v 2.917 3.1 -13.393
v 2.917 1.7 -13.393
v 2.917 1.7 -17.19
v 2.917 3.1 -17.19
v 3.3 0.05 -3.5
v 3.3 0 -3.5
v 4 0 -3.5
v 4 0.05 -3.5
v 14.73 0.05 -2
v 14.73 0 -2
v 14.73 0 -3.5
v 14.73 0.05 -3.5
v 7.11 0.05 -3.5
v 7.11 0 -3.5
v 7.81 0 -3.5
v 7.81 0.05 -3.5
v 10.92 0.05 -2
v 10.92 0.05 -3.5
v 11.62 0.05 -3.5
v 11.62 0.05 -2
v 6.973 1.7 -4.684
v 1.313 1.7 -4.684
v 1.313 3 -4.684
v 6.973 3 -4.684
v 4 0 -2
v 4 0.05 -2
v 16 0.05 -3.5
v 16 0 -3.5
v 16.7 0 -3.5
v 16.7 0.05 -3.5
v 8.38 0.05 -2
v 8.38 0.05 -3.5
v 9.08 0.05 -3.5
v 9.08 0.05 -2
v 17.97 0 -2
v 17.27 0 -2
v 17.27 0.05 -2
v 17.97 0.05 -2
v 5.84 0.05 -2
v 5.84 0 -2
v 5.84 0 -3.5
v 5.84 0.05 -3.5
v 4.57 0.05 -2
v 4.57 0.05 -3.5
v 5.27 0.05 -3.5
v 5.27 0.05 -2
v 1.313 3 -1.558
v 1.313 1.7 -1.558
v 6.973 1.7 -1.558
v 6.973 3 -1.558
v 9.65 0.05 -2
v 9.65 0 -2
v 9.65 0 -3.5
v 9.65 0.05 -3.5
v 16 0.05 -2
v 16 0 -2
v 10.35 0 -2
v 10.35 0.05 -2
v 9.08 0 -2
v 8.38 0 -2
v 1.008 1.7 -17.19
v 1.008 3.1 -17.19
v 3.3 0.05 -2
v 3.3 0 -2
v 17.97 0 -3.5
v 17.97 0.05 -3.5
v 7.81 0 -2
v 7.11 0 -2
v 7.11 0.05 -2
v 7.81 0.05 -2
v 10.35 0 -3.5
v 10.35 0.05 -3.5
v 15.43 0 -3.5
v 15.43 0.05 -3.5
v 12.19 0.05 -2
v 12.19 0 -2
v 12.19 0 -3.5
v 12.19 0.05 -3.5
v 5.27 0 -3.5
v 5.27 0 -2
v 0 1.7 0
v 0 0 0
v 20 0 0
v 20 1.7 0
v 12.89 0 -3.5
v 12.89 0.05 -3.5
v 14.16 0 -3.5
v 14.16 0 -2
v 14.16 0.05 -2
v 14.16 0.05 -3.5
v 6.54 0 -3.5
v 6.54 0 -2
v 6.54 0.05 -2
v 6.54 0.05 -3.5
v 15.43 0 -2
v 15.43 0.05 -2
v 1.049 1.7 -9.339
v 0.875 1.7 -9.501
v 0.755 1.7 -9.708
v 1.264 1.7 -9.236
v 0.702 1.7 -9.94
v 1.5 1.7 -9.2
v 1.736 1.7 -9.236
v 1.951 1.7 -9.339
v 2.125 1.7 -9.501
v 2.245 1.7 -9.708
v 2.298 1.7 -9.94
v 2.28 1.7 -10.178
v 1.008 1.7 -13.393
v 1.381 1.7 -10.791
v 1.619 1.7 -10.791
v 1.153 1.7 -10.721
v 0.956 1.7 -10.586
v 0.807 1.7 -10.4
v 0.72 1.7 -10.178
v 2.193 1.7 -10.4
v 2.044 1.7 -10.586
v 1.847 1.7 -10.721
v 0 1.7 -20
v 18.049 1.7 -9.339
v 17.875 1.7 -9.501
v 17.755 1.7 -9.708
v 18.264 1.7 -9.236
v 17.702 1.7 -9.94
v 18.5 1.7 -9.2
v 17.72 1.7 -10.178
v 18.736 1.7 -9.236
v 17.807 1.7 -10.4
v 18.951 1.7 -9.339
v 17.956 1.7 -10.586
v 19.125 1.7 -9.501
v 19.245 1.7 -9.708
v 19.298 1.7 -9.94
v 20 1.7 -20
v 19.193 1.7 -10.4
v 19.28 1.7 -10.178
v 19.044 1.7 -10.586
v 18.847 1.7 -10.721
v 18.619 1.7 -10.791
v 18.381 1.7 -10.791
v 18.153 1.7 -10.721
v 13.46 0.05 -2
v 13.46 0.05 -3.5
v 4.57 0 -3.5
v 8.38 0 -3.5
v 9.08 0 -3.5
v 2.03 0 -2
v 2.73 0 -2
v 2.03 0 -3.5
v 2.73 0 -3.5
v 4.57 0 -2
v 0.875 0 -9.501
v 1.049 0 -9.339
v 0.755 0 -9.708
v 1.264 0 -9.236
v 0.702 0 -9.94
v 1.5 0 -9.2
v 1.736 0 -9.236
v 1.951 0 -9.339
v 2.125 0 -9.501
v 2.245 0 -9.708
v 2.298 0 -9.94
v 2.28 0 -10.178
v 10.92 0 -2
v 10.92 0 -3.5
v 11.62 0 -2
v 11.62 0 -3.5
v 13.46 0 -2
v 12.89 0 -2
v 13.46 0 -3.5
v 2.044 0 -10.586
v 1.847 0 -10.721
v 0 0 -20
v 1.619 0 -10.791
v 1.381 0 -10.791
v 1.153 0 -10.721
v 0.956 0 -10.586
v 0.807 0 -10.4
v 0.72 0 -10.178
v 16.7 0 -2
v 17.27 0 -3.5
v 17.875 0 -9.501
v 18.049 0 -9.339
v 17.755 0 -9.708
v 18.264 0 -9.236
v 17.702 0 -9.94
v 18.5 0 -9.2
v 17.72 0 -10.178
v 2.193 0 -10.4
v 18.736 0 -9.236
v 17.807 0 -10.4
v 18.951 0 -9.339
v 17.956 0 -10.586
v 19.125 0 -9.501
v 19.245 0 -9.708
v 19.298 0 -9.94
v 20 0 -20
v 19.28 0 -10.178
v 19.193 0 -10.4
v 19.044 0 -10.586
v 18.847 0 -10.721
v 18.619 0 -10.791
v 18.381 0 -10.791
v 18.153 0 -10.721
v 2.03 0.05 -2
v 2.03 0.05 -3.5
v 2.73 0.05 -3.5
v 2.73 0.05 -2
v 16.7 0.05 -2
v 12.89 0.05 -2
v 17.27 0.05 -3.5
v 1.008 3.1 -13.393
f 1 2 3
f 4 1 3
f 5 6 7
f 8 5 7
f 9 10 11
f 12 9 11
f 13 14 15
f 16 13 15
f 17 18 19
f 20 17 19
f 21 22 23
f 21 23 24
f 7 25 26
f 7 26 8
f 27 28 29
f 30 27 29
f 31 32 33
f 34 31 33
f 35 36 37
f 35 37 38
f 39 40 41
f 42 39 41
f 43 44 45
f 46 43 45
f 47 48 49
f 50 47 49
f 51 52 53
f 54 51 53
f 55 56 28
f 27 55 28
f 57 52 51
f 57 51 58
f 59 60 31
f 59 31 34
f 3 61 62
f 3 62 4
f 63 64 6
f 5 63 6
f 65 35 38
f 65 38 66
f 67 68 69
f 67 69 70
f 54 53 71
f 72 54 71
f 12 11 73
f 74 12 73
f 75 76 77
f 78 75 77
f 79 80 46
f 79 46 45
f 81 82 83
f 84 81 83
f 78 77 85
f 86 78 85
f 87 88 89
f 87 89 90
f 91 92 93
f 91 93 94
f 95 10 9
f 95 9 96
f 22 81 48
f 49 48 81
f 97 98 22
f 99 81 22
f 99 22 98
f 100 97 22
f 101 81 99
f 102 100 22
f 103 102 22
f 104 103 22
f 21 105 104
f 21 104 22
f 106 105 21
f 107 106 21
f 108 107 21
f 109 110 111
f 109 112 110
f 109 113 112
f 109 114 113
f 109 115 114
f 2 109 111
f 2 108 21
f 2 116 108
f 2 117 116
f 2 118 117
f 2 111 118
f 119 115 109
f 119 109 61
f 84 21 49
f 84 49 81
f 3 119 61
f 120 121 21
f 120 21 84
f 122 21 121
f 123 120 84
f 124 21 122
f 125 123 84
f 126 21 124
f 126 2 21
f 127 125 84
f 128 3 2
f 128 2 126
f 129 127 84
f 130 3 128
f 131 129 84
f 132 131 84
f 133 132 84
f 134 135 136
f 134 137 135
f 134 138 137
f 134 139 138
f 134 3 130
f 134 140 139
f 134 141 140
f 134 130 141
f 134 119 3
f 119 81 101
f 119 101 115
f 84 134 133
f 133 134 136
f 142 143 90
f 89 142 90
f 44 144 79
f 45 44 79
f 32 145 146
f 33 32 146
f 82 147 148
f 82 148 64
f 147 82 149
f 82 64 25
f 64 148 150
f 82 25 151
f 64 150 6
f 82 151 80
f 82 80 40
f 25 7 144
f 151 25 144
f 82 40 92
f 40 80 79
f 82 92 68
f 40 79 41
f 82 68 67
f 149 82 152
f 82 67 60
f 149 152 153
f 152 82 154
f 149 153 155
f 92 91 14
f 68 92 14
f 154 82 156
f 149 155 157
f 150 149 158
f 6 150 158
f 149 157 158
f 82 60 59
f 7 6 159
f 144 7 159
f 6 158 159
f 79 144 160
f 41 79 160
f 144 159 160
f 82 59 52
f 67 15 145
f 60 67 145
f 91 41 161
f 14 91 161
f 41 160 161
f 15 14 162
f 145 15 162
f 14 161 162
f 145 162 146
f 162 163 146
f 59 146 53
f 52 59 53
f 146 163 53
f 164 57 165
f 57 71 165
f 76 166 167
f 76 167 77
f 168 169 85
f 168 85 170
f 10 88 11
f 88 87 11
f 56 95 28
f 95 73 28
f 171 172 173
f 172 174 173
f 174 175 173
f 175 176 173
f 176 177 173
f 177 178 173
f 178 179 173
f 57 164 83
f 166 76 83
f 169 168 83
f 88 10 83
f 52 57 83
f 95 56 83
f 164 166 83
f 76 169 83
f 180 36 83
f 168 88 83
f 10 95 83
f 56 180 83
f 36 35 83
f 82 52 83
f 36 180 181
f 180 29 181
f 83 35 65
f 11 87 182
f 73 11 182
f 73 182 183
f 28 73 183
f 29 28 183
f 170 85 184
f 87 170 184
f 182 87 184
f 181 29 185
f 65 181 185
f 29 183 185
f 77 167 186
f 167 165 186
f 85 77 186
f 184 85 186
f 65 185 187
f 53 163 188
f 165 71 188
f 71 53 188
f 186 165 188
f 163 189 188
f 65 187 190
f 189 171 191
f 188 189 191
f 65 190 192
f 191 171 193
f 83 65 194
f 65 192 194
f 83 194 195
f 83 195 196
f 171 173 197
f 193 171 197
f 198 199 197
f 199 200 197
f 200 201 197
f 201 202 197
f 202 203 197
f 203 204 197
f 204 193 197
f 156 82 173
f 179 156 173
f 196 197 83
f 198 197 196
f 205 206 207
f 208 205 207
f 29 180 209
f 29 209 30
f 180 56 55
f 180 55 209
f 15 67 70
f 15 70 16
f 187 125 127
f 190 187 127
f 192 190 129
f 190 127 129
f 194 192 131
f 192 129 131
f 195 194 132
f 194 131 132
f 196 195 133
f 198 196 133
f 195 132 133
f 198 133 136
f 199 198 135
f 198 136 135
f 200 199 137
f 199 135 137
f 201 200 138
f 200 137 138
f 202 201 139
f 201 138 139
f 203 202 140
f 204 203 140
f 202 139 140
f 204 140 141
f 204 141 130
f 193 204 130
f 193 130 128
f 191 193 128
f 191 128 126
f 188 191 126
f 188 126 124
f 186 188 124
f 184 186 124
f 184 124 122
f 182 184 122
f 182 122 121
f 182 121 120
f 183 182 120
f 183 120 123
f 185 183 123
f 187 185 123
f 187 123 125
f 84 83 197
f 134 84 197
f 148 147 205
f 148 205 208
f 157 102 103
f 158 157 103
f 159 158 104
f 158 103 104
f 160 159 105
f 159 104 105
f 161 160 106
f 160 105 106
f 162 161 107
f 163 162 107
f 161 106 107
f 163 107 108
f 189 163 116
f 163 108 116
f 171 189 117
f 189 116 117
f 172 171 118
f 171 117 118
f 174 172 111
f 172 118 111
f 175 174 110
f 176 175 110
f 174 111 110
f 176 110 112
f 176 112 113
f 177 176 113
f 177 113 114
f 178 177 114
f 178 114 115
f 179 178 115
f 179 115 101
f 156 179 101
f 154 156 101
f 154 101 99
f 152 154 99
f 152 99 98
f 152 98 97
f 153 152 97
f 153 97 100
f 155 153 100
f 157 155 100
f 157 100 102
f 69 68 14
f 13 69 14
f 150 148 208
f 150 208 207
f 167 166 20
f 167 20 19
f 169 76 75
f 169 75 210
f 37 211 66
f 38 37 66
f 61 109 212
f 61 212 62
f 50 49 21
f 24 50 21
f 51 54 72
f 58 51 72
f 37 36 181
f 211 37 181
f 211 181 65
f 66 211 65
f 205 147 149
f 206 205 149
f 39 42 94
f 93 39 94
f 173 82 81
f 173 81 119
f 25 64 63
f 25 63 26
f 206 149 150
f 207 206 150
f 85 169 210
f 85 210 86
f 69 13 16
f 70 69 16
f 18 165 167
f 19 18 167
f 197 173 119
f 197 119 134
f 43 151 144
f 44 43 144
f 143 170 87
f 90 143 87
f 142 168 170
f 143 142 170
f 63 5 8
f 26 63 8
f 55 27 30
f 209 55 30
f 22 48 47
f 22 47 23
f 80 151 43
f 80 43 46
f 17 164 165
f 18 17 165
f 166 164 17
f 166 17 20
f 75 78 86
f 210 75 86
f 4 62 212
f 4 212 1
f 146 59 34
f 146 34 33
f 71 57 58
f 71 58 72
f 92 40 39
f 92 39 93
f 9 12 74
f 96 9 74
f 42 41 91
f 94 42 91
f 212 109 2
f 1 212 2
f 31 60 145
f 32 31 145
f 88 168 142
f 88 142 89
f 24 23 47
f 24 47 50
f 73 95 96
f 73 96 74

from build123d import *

# Parameters (mm, degrees)
SKETCH_1_W          = 20
SKETCH_1_H          = 20
EXTRUDE_1_DEPTH     = 1.7
SKETCH_2_W          = 0.7
SKETCH_2_H          = 1.5
CUT_EXTRUDE_1_DEPTH = 0.05
SKETCH_3_R          = 0.8
CUT_EXTRUDE_2_DEPTH = 29.335313656
SKETCH_6_W          = 5.659546013
SKETCH_6_H          = 3.125880025
EXTRUDE_4_DEPTH     = 1.3
SKETCH_7_W          = 1.909465354
SKETCH_7_H          = 3.796411433
EXTRUDE_5_DEPTH     = 1.4


with BuildPart() as part:
    # 스케치1 → 보스-돌출1 (new body)
    with BuildSketch(Plane(origin=(0, 0, 0), x_dir=(1, 0, 0), z_dir=(0, 1, 0))):
        with Locations((10, 10)):
            Rectangle(SKETCH_1_W, SKETCH_1_H)
    extrude(amount=EXTRUDE_1_DEPTH)

    # 스케치2 → 컷-돌출1 (cut)
    with BuildSketch(Plane(origin=(0, 0, 0), x_dir=(1, 0, 0), z_dir=(0, 1, 0))):
        with Locations((2.38, 2.75)):
            Rectangle(SKETCH_2_W, SKETCH_2_H)
        with Locations((3.65, 2.75)):
            Rectangle(SKETCH_2_W, SKETCH_2_H)
        with Locations((4.92, 2.75)):
            Rectangle(SKETCH_2_W, SKETCH_2_H)
        with Locations((6.19, 2.75)):
            Rectangle(SKETCH_2_W, SKETCH_2_H)
        with Locations((7.46, 2.75)):
            Rectangle(SKETCH_2_W, SKETCH_2_H)
        with Locations((8.73, 2.75)):
            Rectangle(SKETCH_2_W, SKETCH_2_H)
        with Locations((10, 2.75)):
            Rectangle(SKETCH_2_W, SKETCH_2_H)
        with Locations((11.27, 2.75)):
            Rectangle(SKETCH_2_W, SKETCH_2_H)
        with Locations((12.54, 2.75)):
            Rectangle(SKETCH_2_W, SKETCH_2_H)
        with Locations((13.81, 2.75)):
            Rectangle(SKETCH_2_W, SKETCH_2_H)
        with Locations((15.08, 2.75)):
            Rectangle(SKETCH_2_W, SKETCH_2_H)
        with Locations((16.35, 2.75)):
            Rectangle(SKETCH_2_W, SKETCH_2_H)
        with Locations((17.62, 2.75)):
            Rectangle(SKETCH_2_W, SKETCH_2_H)
    extrude(amount=CUT_EXTRUDE_1_DEPTH, mode=Mode.SUBTRACT)

    # 스케치3 → 컷-돌출2 (cut, through all)
    with BuildSketch(Plane(origin=(0, 1.7, 0), x_dir=(1, 0, 0), z_dir=(0, 1, 0))):
        with Locations(Location((1.5, 10, 0), (0, 0, 270))):
            Circle(SKETCH_3_R)
        with Locations(Location((18.5, 10, 0), (0, 0, 270))):
            Circle(SKETCH_3_R)
    extrude(amount=-CUT_EXTRUDE_2_DEPTH, mode=Mode.SUBTRACT)

    # 스케치6 → 보스-돌출4 (add)
    with BuildSketch(Plane(origin=(0, 1.7, 0), x_dir=(1, 0, 0), z_dir=(0, 1, 0))):
        with Locations((4.142822267, 3.120933029)):
            Rectangle(SKETCH_6_W, SKETCH_6_H)
    extrude(amount=EXTRUDE_4_DEPTH)

    # 스케치7 → 보스-돌출5 (add)
    with BuildSketch(Plane(origin=(0, 1.7, 0), x_dir=(1, 0, 0), z_dir=(0, 1, 0))):
        with Locations((1.96252084, 15.291638164)):
            Rectangle(SKETCH_7_W, SKETCH_7_H)
    extrude(amount=EXTRUDE_5_DEPTH)


solid = part.part
